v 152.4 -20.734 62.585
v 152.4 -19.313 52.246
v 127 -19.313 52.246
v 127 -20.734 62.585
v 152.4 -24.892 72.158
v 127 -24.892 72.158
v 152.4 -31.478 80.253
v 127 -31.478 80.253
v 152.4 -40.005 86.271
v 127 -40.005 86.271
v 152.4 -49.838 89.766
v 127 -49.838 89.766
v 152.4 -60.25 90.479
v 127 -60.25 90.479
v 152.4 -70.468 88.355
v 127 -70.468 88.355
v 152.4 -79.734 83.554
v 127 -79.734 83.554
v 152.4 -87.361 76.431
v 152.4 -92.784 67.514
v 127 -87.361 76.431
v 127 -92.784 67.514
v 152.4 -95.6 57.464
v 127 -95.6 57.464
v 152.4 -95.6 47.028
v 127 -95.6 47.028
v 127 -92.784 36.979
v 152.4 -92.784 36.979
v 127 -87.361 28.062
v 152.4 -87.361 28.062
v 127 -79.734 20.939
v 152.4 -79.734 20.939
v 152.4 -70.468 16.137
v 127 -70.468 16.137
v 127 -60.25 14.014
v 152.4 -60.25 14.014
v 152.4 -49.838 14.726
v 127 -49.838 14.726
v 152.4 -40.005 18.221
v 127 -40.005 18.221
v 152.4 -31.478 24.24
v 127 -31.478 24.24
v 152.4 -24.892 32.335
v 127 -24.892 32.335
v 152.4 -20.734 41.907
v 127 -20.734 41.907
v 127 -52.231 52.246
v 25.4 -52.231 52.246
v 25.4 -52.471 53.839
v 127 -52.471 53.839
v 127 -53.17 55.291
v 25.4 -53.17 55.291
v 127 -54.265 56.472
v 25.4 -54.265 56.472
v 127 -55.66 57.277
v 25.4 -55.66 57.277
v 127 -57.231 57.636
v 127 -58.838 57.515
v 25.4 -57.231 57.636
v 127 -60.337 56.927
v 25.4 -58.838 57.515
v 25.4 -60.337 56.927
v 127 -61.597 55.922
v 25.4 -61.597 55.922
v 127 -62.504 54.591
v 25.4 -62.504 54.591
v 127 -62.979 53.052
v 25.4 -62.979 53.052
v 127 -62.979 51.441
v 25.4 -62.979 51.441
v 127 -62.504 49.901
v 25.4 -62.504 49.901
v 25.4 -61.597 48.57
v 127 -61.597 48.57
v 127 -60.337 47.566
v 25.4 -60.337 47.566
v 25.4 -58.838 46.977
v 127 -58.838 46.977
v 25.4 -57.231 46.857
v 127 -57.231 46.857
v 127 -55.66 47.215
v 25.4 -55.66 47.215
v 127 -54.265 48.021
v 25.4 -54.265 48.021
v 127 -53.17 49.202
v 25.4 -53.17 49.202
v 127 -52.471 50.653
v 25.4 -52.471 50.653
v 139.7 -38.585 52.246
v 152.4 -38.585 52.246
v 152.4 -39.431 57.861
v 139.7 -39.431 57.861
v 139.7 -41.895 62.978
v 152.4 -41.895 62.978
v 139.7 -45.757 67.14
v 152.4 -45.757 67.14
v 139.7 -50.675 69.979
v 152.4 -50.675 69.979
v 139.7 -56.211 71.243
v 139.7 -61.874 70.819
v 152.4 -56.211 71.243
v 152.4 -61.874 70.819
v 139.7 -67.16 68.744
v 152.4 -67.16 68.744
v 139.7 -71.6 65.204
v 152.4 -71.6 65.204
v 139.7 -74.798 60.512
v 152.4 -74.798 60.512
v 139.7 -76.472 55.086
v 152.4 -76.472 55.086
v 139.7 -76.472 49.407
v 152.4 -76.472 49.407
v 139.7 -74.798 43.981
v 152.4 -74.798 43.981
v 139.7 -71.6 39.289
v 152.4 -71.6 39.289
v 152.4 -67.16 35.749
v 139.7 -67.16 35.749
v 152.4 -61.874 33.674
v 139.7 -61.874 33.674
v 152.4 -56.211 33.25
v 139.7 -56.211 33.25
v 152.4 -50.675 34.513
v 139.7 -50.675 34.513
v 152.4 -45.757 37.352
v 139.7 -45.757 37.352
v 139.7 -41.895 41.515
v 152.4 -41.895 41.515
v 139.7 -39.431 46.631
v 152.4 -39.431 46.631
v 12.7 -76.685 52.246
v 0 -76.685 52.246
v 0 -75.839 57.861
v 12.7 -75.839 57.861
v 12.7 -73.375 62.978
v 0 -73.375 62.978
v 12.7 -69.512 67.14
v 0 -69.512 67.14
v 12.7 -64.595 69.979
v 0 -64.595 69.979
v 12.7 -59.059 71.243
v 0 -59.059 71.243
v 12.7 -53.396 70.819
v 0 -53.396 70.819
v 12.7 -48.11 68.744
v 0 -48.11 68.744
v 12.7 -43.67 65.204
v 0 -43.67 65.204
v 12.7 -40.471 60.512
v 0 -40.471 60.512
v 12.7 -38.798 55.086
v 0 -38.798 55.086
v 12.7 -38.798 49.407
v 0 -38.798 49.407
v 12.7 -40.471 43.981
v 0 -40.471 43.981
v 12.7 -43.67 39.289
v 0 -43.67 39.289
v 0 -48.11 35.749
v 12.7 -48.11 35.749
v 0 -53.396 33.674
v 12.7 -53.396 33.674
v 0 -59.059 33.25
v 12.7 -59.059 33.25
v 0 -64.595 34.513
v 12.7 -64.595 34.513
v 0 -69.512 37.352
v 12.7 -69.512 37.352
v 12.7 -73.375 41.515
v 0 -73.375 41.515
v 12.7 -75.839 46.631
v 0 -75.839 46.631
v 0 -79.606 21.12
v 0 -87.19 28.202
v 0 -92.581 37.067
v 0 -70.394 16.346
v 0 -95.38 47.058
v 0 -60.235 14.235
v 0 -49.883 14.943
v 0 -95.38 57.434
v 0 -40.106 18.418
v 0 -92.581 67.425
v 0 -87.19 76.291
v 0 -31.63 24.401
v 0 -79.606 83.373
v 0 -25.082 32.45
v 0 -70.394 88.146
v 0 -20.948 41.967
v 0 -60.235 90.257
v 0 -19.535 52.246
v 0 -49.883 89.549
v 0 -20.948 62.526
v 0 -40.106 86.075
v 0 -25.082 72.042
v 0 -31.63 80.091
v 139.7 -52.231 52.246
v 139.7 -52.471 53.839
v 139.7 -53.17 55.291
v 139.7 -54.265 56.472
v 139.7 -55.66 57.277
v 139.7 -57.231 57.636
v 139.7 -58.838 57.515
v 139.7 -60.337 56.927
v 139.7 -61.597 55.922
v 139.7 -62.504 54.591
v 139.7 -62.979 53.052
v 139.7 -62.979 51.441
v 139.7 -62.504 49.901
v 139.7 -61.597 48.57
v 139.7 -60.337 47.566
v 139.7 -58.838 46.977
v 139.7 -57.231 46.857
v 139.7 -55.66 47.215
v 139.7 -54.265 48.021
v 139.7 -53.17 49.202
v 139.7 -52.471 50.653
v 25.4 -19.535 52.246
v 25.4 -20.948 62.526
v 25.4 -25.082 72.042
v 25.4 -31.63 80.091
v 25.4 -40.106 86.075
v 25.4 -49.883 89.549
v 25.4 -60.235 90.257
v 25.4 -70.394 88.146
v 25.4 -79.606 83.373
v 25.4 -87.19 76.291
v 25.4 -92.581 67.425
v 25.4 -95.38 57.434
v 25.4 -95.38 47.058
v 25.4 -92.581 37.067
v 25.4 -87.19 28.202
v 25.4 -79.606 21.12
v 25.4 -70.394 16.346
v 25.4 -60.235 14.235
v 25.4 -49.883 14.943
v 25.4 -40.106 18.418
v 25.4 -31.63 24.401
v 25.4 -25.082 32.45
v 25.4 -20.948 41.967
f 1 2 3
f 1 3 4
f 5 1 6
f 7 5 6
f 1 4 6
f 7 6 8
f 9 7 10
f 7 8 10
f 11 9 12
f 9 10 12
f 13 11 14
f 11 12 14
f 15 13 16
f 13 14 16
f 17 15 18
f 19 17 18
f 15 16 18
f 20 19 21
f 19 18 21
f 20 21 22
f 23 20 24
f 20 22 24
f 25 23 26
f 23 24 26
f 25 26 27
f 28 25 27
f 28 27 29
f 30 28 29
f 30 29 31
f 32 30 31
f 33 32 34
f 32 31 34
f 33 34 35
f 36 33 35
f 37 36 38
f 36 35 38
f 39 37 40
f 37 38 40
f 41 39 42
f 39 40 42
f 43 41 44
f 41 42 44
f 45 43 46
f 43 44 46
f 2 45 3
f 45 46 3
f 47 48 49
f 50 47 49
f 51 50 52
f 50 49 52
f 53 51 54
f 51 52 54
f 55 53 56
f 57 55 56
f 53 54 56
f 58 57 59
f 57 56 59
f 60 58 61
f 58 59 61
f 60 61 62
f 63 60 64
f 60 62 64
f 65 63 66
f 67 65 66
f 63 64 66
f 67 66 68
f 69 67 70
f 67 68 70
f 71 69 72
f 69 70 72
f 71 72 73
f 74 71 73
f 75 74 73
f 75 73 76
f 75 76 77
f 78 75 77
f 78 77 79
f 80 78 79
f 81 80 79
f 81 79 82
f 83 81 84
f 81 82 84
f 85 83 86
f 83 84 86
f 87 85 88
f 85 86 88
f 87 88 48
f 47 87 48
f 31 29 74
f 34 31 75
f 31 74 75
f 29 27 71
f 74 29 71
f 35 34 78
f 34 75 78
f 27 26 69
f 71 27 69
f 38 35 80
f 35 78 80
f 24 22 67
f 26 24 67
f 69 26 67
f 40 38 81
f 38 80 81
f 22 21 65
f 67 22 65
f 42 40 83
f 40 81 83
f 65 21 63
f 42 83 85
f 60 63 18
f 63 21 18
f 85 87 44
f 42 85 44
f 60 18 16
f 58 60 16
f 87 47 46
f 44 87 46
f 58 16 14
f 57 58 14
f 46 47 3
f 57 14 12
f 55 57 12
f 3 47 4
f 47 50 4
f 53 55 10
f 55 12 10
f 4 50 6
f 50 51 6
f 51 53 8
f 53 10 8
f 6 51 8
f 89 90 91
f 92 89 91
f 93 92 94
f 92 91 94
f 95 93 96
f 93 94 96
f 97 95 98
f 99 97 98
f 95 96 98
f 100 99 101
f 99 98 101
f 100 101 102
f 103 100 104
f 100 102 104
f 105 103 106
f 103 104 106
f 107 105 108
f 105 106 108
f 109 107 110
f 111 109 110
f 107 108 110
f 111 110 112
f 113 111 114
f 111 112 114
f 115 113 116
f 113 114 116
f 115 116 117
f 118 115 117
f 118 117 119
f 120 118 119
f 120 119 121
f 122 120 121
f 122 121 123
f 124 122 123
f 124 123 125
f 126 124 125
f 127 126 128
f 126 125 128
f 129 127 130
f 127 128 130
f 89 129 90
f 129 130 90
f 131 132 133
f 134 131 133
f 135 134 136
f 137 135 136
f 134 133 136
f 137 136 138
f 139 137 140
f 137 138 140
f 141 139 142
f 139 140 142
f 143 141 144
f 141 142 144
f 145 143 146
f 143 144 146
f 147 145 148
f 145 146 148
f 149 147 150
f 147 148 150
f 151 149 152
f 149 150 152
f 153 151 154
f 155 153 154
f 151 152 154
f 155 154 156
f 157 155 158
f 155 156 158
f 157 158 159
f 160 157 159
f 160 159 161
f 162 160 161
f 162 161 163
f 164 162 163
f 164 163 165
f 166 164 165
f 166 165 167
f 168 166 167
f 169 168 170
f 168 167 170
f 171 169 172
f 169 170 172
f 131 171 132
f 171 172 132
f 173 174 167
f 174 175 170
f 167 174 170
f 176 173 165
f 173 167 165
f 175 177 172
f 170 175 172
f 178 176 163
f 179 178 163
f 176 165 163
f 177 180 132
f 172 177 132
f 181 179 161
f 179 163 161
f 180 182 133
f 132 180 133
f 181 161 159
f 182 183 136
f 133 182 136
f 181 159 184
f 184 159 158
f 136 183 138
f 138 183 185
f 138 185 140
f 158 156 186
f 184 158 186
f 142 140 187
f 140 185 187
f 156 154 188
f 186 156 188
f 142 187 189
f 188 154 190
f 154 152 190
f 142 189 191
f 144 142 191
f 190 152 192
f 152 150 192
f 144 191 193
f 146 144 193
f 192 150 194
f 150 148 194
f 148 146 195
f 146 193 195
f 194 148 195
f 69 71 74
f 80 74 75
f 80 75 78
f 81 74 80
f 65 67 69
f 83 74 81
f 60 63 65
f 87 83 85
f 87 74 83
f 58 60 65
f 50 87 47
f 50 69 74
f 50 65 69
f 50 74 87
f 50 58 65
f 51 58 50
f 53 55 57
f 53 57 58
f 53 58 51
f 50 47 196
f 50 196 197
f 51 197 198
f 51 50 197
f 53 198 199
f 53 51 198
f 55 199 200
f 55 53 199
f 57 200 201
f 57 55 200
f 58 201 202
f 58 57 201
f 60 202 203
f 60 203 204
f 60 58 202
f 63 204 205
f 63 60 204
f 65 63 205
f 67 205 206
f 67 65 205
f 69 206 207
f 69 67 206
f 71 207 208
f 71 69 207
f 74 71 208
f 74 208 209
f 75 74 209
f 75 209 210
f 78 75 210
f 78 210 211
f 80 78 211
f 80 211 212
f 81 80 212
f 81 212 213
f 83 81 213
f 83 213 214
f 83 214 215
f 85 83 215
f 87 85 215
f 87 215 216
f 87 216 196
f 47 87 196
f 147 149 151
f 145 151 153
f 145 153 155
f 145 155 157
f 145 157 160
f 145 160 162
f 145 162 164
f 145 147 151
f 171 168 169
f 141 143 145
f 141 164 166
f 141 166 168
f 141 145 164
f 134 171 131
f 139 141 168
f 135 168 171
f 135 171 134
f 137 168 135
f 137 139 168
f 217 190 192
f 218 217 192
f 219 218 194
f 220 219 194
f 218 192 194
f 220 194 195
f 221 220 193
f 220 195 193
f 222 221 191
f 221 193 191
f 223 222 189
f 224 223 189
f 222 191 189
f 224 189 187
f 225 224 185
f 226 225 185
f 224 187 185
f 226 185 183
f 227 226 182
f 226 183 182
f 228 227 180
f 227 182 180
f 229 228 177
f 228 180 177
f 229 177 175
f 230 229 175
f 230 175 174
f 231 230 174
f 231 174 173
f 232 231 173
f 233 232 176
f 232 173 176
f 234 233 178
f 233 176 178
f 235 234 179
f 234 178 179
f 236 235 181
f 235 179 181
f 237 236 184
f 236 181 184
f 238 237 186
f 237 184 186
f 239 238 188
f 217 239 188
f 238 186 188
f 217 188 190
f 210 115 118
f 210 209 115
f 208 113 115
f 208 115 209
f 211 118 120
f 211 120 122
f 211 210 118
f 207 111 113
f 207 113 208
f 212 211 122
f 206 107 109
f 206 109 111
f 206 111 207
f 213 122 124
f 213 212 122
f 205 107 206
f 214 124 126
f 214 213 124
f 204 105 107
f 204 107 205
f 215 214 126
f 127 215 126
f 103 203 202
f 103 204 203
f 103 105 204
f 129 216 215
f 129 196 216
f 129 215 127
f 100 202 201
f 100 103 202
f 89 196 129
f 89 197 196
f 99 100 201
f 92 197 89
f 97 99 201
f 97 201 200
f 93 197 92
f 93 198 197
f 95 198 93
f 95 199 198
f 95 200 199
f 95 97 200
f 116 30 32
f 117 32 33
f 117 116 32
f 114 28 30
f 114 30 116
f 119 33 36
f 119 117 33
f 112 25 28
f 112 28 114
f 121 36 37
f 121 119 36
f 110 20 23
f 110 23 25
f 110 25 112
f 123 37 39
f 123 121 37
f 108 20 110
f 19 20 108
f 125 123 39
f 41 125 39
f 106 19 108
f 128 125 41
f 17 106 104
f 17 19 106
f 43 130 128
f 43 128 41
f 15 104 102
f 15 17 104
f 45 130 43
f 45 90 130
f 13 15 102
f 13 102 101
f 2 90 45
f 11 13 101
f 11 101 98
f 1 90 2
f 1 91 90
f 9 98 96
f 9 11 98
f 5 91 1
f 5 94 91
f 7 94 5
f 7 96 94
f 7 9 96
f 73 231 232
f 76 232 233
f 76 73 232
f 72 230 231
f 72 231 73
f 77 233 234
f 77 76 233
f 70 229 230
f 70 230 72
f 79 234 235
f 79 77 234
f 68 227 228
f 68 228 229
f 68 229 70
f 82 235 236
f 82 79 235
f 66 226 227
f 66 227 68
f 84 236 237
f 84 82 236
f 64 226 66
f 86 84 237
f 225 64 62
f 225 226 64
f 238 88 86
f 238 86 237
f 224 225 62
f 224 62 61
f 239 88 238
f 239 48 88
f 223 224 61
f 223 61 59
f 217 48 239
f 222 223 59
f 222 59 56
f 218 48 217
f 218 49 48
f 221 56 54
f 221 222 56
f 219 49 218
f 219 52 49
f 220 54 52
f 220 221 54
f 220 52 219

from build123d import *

# Parameters (mm, degrees)
F0_R      = 38.1
F1_DEPTH  = 25.4
F2_R      = 5.4044200522
F3_DEPTH  = 101.6
F4_R      = 38.32155554
F4_R_2    = 5.4044200522
F5_DEPTH  = 25.4
F6_R      = 19.05
F7_DEPTH  = 12.7
F8_R      = 19.05
F8_R_2    = 5.4044200522
F9_DEPTH  = 12.7
F11_R     = 2.8477624551
F11_R_2   = 2.8477650893
F11_R_3   = 3.1838963947
F11_R_4   = 3.0621740495
F11_R_5   = 3.2234527355
F11_R_6   = 3.630200632
F11_R_7   = 3.5239234567
F11_R_8   = 3.2234498266
F12_DEPTH = 12.7


with BuildPart() as f1:
    # F0 (on Right) → F1 (new body)
    with BuildSketch(Plane.YZ):
        with Locations((-57.6349385083, 52.2463060915)):
            Circle(F0_R)
    extrude(amount=F1_DEPTH)

    # F2 (on face) → F3 (join)
    with BuildSketch(Plane.YZ.offset(25.4)):
        with Locations((-57.6349385083, 52.2463060915)):
            Circle(F2_R)
    extrude(amount=F3_DEPTH)

    # F6 (on face) → F7 (cut)
    with BuildSketch(Plane(origin=(0, 0, 0), x_dir=(0, -1, 0), z_dir=(-1, 0, 0))):
        with Locations((57.6349385083, 52.2463060915)):
            Circle(F6_R)
    extrude(amount=-F7_DEPTH, mode=Mode.SUBTRACT)

    # F11 (on face) → F12 (cut)
    with BuildSketch(Plane(origin=(0, 0, 0), x_dir=(0, -1, 0), z_dir=(-1, 0, 0))):
        with Locations((62.1656402946, 37.3954698443)):
            Circle(F11_R)
        with Locations((51.5938587487, 37.3954698443)):
            Circle(F11_R_2)
        with Locations((44.5460006595, 45.953579247)):
            Circle(F11_R_3)
        with Locations((44.5460006595, 56.0219436884)):
            Circle(F11_R_4)
        with Locations((52.0972758532, 63.0697980523)):
            Circle(F11_R_5)
        with Locations((62.1656402946, 63.5732188821)):
            Circle(F11_R_6)
        with Locations((70.2203288674, 56.5253607929)):
            Circle(F11_R_7)
        with Locations((70.2203288674, 44.9467413127)):
            Circle(F11_R_8)
    extrude(amount=-F12_DEPTH, mode=Mode.SUBTRACT)


with BuildPart() as f5:
    # F4 (on face) → F5 (new body)
    with BuildSketch(Plane.YZ.offset(127)):
        with Locations((-57.6349385083, 52.2463060915)):
            Circle(F4_R)
        with Locations((-57.6349385083, 52.2463060915)):
            Circle(F4_R_2, mode=Mode.SUBTRACT)
    extrude(amount=F5_DEPTH)

    # F8 (on face) → F9 (cut)
    with BuildSketch(Plane.YZ.offset(152.4)):
        with Locations((-57.6349385083, 52.2463060915)):
            Circle(F8_R)
        with Locations((-57.6349385083, 52.2463060915)):
            Circle(F8_R_2, mode=Mode.SUBTRACT)
    extrude(amount=-F9_DEPTH, mode=Mode.SUBTRACT)


solid = Compound([f1.part, f5.part])
